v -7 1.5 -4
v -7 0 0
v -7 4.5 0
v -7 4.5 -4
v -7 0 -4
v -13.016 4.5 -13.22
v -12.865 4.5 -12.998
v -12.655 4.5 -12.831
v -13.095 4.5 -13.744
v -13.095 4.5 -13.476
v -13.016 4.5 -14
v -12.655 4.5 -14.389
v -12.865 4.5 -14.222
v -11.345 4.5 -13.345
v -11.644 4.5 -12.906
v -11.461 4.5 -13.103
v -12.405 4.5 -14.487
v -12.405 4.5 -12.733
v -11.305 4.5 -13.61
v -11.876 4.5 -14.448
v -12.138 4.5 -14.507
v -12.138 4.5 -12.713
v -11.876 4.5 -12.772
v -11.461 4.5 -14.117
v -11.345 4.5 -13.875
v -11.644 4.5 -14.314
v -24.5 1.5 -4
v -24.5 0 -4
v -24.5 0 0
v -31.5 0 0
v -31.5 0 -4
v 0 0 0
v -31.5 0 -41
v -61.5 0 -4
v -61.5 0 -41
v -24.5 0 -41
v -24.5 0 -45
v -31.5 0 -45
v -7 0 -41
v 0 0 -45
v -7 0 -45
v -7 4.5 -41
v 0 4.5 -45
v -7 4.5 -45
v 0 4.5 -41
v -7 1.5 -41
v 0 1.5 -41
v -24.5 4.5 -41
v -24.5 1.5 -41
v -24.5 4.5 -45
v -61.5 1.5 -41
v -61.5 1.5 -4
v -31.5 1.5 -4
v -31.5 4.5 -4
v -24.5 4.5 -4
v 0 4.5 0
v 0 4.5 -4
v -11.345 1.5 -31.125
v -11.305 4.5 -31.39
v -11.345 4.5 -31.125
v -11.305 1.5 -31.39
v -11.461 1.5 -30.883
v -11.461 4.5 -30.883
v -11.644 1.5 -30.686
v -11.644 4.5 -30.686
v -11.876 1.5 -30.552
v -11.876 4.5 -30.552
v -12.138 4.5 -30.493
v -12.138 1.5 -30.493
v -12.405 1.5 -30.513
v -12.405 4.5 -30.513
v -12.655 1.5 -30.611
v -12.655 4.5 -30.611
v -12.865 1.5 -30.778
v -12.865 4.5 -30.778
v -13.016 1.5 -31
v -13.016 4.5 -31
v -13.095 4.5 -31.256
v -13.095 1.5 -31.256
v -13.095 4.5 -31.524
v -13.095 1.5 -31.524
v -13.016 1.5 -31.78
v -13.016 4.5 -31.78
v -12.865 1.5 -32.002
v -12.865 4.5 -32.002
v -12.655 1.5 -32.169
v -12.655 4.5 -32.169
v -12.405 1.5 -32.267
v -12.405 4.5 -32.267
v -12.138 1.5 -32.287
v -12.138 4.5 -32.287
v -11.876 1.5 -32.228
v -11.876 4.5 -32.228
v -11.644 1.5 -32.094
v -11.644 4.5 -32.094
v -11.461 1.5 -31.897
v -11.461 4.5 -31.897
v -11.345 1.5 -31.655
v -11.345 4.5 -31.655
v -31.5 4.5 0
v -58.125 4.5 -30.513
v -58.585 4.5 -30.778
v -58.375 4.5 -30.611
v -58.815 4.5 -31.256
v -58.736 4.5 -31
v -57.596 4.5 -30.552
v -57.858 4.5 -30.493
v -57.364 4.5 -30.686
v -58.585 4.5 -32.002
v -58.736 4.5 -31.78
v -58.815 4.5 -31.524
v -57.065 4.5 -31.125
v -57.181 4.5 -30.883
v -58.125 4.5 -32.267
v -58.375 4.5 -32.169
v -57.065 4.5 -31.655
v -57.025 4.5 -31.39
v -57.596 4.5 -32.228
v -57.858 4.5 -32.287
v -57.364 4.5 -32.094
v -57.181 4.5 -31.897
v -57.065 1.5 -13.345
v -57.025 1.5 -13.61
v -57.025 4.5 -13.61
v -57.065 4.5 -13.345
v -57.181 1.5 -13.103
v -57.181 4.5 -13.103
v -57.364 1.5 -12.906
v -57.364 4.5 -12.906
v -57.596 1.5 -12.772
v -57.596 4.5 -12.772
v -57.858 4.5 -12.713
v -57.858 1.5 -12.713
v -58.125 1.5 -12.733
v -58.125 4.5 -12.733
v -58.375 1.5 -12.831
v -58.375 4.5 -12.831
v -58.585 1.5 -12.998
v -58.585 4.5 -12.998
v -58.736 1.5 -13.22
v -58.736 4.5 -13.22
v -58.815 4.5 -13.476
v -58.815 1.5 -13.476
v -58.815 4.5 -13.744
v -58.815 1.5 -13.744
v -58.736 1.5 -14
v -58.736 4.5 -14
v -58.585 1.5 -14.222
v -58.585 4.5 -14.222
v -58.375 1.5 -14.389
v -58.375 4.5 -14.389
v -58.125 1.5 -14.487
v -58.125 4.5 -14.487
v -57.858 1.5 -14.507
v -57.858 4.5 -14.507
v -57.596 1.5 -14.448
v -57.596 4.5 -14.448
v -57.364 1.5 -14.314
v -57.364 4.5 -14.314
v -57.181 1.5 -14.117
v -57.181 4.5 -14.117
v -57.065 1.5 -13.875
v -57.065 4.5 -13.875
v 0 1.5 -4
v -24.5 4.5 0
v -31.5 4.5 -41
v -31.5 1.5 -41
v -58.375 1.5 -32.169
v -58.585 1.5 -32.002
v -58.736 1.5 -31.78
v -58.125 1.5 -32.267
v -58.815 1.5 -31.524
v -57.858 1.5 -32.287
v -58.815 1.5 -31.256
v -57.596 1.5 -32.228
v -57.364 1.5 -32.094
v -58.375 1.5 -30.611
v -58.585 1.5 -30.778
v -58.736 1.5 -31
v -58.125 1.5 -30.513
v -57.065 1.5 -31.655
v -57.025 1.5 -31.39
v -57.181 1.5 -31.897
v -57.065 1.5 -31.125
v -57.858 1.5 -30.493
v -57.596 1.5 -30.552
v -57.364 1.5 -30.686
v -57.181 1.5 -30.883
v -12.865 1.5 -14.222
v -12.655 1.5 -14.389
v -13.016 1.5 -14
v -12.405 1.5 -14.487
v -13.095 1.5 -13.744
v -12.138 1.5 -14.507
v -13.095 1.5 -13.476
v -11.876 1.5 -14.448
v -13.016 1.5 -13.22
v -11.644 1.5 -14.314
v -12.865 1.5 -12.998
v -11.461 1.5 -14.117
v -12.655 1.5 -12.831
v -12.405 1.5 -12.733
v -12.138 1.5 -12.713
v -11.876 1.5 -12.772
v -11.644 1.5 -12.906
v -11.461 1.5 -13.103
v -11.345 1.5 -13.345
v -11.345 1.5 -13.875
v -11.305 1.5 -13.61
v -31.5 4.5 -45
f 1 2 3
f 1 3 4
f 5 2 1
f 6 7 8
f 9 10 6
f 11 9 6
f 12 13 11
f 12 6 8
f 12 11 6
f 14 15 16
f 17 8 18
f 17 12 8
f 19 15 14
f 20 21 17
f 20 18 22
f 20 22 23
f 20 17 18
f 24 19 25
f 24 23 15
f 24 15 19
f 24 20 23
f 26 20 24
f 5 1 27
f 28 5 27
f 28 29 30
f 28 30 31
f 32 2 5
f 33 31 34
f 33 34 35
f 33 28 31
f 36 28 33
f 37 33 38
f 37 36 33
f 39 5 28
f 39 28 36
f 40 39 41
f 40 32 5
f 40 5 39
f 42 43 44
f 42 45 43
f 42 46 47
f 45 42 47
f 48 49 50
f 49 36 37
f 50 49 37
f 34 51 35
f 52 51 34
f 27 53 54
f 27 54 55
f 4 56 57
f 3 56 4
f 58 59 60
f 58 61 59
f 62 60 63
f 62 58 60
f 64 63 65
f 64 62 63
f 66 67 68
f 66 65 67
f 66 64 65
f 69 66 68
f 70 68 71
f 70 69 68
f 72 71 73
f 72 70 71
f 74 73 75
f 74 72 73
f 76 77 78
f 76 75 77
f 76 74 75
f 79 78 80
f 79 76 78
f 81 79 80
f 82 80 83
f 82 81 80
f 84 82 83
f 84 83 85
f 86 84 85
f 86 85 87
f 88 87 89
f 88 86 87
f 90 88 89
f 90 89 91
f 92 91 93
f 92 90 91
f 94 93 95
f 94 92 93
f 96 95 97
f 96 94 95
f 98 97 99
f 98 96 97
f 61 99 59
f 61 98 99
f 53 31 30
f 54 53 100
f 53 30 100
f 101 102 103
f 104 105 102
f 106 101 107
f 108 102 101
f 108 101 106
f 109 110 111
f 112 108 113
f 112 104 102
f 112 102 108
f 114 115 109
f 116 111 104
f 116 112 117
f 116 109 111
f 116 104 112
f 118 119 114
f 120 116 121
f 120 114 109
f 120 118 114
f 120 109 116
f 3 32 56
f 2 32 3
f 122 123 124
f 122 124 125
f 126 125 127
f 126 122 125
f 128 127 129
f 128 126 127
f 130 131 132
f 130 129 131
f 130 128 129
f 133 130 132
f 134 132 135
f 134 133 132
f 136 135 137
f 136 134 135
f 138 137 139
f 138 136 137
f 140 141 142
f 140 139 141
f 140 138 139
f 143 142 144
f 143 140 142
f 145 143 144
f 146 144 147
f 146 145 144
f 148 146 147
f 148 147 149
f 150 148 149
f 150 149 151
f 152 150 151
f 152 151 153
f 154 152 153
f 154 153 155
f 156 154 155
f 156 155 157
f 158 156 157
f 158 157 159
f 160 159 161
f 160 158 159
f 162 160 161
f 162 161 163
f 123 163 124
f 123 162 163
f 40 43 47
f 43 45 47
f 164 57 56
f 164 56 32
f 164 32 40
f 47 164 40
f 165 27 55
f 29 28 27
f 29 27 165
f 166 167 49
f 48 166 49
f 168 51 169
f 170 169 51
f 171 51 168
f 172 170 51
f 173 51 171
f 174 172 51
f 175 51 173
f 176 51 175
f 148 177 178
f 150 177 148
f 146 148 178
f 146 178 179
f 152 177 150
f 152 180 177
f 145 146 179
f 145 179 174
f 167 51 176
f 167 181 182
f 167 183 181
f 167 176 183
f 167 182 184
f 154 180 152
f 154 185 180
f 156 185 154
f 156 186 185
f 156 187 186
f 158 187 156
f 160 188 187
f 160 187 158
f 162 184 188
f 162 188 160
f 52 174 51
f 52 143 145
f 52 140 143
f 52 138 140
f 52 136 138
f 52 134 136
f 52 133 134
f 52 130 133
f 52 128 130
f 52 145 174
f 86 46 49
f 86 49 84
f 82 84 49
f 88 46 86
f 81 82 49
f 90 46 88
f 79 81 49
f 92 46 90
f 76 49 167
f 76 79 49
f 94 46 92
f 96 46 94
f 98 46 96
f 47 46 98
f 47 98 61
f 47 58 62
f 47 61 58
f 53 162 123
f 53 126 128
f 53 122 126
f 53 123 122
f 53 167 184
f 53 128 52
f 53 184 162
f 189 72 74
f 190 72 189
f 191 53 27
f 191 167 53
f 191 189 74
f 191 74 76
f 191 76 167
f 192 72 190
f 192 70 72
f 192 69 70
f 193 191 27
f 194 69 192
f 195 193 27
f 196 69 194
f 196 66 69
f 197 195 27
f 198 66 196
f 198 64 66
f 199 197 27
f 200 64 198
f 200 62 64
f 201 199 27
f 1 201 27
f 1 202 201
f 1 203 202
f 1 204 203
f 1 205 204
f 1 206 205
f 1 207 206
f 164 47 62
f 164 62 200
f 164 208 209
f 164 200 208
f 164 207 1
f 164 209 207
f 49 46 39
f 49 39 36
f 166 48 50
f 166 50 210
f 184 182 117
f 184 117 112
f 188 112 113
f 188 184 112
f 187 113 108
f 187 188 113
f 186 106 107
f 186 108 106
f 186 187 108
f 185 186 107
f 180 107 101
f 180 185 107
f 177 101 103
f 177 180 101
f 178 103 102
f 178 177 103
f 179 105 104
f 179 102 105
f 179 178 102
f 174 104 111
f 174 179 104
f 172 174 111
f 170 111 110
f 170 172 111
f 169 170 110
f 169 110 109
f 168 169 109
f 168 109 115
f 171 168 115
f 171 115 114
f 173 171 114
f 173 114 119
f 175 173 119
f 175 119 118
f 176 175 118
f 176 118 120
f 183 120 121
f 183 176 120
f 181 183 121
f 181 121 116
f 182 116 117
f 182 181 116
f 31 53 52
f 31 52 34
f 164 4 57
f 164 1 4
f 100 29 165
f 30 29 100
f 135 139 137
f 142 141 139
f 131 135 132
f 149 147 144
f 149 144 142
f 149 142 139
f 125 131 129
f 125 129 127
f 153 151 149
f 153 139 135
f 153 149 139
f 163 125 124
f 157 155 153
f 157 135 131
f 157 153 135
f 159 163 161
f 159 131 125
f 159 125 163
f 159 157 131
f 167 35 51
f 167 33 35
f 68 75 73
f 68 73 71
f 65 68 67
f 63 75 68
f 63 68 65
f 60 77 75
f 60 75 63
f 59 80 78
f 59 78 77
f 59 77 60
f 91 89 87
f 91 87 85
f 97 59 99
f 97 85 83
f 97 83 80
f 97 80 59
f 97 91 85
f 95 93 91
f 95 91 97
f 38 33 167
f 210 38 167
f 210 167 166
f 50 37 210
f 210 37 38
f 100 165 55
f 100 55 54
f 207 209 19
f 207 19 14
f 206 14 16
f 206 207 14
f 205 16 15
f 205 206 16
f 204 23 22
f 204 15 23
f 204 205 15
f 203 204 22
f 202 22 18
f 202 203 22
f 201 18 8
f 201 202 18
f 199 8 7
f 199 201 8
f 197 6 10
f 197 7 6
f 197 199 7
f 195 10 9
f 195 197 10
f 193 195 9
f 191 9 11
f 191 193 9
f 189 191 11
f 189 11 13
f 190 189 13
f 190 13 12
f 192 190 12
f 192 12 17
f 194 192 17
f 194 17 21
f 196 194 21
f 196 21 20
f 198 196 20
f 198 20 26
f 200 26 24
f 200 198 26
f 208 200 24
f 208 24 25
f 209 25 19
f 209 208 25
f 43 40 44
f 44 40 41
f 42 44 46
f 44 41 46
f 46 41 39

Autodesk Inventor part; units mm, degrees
ref_plane "YZ Plane" through (0, 0, 0) normal (1, 0, 0) x (0, 1, 0)
ref_plane "XZ Plane" through (0, 0, 0) normal (0, 1, 0) x (-1, 0, 0)
ref_plane "XY Plane" through (0, 0, 0) normal (0, 0, 1) x (1, 0, 0)
sketch "Sketch1" plane through (0, 0, 0) normal (0, 1, 0) x (-1, 0, 0)
  line L0 (0, 0) -> (7, 0)
  line L1 (7, 0) -> (7, -4)
  line L2 (7, -4) -> (0, -4)
  line L3 (0, -4) -> (0, 0)
  line L4 (0, -22.5) -> (26.9418, -22.5) construction
  line L5 (24.5, 0) -> (31.5, 0)
  line L6 (31.5, 0) -> (31.5, -4)
  line L7 (31.5, -4) -> (24.5, -4)
  line L8 (24.5, -4) -> (24.5, 0)
  line L9 (0, -45) -> (7, -45)
  line L10 (7, -45) -> (7, -41)
  line L11 (7, -41) -> (0, -41)
  line L12 (0, -41) -> (0, -45)
  line L13 (24.5, -45) -> (31.5, -45)
  line L14 (31.5, -45) -> (31.5, -41)
  line L15 (31.5, -41) -> (24.5, -41)
  line L16 (24.5, -41) -> (24.5, -45)
  dimension "d0" = 7
  dimension "d1" = 4
  dimension "d2" = 18.5
  dimension "d3" = 7
  dimension "d4" = 17.5
  dimension "d5" = 37
  dimension "d15" = 4
extrude "Extrusion1" add sketch "Sketch1" along normal blind 4.5
sketch "Sketch2" plane through (0, 0, -4) normal (0, 0, -1) x (-1, 0, 0)
  line L0 (0, 0) -> (7, 0) projected
  line L1 (31.5, 0) -> (31.5, 4.5) projected
  line L2 (0, 0) -> (31.5, 0)
  line L3 (31.5, 0) -> (31.5, 1.5)
  line L4 (31.5, 1.5) -> (0, 1.5)
  line L5 (0, 1.5) -> (0, 0)
  dimension "d8" = 1.5
  dimension "d11" = 31.5
extrude "Extrusion2" add sketch "Sketch2" along normal blind 37
sketch "Sketch3" plane through (0, 0, 0) normal (0, -1, 0) x (1, 0, 0)
  point P0 (0, 0)
sketch "Sketch4" plane through (-31.5, 0, 0) normal (-1, 0, 0) x (0, 0, 1)
  line L0 (-41, 1.5) -> (-41, 4.5) projected
  line L1 (0, 0) -> (-45, 0) projected
  line L2 (-41, 1.5) -> (-4, 1.5)
  line L3 (-4, 1.5) -> (-4, 0)
  line L4 (-4, 0) -> (-41, 0)
  line L5 (-41, 0) -> (-41, 1.5)
  point P0 (-41, 0)
  dimension "d12" = 37
extrude "Extrusion3" add sketch "Sketch4" along normal blind 30
sketch "Sketch5" plane through (-24.5, 1.5, -4) normal (0, 1, 0) x (1, 0, 0)
  circle A0 centre (12.2952, 27.39) radius 0.9
  line L0 (24.5, -4) -> (24.5, 41) construction
  line L1 (24.5, 18.5) -> (-15.4775, 18.5) construction
  circle A1 centre (-33.4248, 27.39) radius 0.9
  circle A2 centre (12.2952, 9.61) radius 0.9
  circle A3 centre (-33.4248, 9.61) radius 0.9
  dimension "d16" = 1.8
  dimension "d17" = 8.89
  dimension "d18" = 1.8
  dimension "d19" = 45.72
  dimension "d22" = 8.89
extrude "Extrusion4" add sketch "Sketch5" along normal blind 3
equation "\"d3\" = d0"
equation "\"d18\" = d16"
equation "\"d22\" = d17"
properties part number "b"
